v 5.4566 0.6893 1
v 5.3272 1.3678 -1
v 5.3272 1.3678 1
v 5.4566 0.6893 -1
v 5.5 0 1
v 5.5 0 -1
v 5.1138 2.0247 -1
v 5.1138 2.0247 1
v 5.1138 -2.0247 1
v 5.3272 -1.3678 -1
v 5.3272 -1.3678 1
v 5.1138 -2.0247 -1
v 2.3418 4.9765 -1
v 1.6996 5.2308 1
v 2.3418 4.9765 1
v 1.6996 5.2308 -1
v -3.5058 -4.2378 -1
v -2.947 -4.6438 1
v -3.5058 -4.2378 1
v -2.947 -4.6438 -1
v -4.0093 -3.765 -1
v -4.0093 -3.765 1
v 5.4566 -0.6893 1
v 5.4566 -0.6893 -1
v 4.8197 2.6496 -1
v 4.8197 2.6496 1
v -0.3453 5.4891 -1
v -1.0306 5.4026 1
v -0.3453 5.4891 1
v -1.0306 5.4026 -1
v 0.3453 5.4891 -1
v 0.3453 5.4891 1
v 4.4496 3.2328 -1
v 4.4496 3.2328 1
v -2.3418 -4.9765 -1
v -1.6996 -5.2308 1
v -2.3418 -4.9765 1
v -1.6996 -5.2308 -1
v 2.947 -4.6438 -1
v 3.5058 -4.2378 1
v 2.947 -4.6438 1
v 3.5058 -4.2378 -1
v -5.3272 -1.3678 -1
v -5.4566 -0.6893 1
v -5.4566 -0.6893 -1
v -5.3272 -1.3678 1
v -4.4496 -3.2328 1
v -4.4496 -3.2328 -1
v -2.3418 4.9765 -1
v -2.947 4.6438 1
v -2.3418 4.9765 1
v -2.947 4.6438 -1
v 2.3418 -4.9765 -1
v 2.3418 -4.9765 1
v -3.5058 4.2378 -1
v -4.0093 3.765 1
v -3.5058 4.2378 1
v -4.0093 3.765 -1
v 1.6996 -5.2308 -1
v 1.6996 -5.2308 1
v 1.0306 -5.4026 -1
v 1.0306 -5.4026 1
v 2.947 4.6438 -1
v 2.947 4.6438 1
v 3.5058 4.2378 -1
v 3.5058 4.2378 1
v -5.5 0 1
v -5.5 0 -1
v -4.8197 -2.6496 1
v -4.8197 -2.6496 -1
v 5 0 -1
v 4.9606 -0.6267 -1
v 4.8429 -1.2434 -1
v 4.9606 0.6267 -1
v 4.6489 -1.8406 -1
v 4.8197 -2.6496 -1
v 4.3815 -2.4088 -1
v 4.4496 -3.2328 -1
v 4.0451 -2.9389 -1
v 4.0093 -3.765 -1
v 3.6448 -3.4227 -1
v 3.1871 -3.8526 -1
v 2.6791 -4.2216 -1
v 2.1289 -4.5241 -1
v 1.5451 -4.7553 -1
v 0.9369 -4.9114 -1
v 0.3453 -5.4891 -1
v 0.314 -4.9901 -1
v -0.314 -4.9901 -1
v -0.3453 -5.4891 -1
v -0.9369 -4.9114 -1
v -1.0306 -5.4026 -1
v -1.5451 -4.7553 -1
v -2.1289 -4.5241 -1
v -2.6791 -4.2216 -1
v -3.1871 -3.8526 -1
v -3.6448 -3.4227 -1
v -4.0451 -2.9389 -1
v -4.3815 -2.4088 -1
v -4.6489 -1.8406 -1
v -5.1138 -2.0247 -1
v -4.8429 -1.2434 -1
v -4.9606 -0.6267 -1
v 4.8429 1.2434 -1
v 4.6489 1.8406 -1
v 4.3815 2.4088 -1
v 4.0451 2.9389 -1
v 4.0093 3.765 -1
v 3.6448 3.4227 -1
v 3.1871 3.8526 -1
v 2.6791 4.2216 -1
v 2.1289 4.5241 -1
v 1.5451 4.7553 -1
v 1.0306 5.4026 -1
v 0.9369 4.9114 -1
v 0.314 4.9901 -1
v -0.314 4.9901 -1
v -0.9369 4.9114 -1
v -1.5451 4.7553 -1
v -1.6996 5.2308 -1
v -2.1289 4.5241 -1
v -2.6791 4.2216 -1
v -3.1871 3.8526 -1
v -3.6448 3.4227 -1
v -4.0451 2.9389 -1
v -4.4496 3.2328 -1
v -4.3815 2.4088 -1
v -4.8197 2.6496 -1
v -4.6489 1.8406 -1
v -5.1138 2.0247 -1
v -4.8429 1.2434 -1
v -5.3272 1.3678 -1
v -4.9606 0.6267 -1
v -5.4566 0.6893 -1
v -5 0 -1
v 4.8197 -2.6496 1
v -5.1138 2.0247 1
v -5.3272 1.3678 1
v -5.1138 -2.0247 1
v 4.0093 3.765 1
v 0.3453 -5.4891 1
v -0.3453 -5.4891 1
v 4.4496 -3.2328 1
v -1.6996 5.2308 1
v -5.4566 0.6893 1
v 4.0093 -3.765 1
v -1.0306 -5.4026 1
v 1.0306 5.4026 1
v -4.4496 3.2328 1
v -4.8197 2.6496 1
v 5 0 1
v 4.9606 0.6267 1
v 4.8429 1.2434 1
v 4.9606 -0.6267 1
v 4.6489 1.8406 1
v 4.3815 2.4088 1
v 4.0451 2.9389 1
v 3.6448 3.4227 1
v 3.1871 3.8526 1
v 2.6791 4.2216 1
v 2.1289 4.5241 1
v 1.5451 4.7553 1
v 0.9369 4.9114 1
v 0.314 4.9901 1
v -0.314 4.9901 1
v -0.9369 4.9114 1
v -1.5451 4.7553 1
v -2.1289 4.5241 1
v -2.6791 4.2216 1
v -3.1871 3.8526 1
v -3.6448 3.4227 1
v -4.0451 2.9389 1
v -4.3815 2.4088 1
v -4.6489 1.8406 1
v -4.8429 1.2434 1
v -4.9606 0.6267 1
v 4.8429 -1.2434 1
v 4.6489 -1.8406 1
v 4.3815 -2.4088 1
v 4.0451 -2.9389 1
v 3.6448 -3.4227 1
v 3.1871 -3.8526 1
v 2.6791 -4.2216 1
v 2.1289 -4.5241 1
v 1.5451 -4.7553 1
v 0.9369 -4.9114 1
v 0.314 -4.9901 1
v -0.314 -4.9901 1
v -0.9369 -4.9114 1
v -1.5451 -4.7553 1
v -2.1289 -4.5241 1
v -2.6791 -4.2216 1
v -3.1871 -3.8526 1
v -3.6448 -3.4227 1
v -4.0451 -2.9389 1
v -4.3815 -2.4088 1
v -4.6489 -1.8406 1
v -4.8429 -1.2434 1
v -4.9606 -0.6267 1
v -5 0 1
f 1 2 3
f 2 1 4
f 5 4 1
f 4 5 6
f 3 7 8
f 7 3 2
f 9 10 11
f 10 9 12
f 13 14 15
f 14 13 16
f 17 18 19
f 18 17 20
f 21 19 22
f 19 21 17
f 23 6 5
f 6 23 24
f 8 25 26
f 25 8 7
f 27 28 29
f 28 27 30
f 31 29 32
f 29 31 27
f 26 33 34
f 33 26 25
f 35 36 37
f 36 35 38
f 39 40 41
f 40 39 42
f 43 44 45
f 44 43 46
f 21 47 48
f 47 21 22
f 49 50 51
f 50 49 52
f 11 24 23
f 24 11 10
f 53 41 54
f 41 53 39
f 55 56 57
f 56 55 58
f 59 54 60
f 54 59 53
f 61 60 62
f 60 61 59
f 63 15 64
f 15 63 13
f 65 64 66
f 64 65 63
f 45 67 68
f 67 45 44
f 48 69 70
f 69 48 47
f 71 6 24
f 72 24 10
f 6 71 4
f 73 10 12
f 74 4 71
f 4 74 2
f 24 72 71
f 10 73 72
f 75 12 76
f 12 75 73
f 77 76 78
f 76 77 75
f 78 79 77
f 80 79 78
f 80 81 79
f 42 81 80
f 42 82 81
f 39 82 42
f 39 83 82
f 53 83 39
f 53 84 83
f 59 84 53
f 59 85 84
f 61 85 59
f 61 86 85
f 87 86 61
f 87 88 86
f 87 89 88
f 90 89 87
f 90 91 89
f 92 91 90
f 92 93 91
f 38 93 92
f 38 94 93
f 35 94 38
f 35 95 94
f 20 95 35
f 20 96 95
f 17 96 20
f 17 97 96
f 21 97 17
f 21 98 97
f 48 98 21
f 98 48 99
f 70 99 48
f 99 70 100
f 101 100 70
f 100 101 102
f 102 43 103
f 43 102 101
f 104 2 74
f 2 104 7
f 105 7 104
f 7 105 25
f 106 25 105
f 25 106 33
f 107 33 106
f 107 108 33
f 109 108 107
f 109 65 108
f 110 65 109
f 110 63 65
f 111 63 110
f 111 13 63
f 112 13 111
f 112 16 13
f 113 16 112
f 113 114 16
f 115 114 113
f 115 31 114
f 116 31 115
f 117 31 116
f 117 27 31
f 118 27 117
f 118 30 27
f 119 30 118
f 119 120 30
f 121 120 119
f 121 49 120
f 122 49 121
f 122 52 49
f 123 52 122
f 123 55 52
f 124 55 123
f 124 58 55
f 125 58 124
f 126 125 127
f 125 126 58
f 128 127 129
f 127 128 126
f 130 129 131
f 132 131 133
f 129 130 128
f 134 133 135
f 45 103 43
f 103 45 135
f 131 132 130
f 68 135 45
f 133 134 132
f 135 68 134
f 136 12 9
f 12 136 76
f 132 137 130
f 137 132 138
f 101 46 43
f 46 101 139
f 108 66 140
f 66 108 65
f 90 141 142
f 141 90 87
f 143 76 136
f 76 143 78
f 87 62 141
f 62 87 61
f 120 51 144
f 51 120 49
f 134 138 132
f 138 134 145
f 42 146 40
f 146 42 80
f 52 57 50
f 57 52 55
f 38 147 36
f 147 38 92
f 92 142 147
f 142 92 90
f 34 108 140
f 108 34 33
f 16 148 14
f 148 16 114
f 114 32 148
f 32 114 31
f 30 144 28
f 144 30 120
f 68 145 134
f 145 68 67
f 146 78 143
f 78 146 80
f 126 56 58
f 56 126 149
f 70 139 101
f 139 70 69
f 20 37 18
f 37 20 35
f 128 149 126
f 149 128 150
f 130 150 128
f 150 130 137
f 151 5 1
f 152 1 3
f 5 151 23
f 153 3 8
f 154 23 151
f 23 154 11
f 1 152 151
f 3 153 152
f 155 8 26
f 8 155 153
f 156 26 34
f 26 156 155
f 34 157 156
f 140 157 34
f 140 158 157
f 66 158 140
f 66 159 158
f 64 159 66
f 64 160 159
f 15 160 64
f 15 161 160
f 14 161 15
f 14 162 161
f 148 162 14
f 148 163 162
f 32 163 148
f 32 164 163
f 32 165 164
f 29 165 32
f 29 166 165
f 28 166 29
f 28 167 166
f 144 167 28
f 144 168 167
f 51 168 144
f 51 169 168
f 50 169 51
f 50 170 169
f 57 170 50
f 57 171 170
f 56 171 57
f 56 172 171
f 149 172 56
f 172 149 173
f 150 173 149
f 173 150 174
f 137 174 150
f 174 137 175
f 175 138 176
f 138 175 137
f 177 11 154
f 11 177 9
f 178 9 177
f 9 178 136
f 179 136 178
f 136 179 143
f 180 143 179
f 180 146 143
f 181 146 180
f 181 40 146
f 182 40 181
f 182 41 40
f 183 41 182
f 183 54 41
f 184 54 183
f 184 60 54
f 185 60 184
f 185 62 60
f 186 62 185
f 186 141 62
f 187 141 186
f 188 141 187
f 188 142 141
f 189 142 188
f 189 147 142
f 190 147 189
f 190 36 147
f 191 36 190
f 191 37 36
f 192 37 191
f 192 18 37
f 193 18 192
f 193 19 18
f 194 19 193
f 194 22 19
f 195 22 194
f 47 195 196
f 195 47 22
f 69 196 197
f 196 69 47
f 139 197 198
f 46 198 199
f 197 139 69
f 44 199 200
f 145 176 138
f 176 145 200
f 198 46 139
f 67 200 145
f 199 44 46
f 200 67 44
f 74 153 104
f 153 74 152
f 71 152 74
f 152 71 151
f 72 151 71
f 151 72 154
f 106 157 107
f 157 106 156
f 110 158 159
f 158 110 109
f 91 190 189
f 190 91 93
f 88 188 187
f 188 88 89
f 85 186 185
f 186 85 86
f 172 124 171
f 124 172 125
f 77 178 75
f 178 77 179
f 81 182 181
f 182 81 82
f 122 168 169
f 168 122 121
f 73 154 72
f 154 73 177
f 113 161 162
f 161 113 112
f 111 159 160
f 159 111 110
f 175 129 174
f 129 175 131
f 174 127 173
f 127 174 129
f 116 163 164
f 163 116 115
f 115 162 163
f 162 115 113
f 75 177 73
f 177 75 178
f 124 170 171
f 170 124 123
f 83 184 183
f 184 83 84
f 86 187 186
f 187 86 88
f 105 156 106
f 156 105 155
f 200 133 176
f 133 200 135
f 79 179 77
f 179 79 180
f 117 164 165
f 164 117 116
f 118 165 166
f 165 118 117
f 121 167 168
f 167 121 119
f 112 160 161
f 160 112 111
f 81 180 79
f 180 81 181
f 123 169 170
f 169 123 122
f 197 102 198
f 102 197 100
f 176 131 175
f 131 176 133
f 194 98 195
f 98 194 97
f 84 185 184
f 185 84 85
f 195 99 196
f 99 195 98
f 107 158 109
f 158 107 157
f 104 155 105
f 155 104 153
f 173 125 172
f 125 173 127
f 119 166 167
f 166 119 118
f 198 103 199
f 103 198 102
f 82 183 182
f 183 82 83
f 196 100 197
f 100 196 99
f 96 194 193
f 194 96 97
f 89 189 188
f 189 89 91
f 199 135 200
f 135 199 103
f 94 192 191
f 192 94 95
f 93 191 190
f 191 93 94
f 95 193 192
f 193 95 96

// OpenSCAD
$fn = 50;


difference() {
	union() {
		translate(v = [0, 0, -1.0000000000]) {
			cylinder(h = 2, r = 5.5000000000);
		}
	}
	union() {
		translate(v = [0, 0, -100.0000000000]) {
			cylinder(h = 200, r = 5.0000000000);
		}
	}
}
